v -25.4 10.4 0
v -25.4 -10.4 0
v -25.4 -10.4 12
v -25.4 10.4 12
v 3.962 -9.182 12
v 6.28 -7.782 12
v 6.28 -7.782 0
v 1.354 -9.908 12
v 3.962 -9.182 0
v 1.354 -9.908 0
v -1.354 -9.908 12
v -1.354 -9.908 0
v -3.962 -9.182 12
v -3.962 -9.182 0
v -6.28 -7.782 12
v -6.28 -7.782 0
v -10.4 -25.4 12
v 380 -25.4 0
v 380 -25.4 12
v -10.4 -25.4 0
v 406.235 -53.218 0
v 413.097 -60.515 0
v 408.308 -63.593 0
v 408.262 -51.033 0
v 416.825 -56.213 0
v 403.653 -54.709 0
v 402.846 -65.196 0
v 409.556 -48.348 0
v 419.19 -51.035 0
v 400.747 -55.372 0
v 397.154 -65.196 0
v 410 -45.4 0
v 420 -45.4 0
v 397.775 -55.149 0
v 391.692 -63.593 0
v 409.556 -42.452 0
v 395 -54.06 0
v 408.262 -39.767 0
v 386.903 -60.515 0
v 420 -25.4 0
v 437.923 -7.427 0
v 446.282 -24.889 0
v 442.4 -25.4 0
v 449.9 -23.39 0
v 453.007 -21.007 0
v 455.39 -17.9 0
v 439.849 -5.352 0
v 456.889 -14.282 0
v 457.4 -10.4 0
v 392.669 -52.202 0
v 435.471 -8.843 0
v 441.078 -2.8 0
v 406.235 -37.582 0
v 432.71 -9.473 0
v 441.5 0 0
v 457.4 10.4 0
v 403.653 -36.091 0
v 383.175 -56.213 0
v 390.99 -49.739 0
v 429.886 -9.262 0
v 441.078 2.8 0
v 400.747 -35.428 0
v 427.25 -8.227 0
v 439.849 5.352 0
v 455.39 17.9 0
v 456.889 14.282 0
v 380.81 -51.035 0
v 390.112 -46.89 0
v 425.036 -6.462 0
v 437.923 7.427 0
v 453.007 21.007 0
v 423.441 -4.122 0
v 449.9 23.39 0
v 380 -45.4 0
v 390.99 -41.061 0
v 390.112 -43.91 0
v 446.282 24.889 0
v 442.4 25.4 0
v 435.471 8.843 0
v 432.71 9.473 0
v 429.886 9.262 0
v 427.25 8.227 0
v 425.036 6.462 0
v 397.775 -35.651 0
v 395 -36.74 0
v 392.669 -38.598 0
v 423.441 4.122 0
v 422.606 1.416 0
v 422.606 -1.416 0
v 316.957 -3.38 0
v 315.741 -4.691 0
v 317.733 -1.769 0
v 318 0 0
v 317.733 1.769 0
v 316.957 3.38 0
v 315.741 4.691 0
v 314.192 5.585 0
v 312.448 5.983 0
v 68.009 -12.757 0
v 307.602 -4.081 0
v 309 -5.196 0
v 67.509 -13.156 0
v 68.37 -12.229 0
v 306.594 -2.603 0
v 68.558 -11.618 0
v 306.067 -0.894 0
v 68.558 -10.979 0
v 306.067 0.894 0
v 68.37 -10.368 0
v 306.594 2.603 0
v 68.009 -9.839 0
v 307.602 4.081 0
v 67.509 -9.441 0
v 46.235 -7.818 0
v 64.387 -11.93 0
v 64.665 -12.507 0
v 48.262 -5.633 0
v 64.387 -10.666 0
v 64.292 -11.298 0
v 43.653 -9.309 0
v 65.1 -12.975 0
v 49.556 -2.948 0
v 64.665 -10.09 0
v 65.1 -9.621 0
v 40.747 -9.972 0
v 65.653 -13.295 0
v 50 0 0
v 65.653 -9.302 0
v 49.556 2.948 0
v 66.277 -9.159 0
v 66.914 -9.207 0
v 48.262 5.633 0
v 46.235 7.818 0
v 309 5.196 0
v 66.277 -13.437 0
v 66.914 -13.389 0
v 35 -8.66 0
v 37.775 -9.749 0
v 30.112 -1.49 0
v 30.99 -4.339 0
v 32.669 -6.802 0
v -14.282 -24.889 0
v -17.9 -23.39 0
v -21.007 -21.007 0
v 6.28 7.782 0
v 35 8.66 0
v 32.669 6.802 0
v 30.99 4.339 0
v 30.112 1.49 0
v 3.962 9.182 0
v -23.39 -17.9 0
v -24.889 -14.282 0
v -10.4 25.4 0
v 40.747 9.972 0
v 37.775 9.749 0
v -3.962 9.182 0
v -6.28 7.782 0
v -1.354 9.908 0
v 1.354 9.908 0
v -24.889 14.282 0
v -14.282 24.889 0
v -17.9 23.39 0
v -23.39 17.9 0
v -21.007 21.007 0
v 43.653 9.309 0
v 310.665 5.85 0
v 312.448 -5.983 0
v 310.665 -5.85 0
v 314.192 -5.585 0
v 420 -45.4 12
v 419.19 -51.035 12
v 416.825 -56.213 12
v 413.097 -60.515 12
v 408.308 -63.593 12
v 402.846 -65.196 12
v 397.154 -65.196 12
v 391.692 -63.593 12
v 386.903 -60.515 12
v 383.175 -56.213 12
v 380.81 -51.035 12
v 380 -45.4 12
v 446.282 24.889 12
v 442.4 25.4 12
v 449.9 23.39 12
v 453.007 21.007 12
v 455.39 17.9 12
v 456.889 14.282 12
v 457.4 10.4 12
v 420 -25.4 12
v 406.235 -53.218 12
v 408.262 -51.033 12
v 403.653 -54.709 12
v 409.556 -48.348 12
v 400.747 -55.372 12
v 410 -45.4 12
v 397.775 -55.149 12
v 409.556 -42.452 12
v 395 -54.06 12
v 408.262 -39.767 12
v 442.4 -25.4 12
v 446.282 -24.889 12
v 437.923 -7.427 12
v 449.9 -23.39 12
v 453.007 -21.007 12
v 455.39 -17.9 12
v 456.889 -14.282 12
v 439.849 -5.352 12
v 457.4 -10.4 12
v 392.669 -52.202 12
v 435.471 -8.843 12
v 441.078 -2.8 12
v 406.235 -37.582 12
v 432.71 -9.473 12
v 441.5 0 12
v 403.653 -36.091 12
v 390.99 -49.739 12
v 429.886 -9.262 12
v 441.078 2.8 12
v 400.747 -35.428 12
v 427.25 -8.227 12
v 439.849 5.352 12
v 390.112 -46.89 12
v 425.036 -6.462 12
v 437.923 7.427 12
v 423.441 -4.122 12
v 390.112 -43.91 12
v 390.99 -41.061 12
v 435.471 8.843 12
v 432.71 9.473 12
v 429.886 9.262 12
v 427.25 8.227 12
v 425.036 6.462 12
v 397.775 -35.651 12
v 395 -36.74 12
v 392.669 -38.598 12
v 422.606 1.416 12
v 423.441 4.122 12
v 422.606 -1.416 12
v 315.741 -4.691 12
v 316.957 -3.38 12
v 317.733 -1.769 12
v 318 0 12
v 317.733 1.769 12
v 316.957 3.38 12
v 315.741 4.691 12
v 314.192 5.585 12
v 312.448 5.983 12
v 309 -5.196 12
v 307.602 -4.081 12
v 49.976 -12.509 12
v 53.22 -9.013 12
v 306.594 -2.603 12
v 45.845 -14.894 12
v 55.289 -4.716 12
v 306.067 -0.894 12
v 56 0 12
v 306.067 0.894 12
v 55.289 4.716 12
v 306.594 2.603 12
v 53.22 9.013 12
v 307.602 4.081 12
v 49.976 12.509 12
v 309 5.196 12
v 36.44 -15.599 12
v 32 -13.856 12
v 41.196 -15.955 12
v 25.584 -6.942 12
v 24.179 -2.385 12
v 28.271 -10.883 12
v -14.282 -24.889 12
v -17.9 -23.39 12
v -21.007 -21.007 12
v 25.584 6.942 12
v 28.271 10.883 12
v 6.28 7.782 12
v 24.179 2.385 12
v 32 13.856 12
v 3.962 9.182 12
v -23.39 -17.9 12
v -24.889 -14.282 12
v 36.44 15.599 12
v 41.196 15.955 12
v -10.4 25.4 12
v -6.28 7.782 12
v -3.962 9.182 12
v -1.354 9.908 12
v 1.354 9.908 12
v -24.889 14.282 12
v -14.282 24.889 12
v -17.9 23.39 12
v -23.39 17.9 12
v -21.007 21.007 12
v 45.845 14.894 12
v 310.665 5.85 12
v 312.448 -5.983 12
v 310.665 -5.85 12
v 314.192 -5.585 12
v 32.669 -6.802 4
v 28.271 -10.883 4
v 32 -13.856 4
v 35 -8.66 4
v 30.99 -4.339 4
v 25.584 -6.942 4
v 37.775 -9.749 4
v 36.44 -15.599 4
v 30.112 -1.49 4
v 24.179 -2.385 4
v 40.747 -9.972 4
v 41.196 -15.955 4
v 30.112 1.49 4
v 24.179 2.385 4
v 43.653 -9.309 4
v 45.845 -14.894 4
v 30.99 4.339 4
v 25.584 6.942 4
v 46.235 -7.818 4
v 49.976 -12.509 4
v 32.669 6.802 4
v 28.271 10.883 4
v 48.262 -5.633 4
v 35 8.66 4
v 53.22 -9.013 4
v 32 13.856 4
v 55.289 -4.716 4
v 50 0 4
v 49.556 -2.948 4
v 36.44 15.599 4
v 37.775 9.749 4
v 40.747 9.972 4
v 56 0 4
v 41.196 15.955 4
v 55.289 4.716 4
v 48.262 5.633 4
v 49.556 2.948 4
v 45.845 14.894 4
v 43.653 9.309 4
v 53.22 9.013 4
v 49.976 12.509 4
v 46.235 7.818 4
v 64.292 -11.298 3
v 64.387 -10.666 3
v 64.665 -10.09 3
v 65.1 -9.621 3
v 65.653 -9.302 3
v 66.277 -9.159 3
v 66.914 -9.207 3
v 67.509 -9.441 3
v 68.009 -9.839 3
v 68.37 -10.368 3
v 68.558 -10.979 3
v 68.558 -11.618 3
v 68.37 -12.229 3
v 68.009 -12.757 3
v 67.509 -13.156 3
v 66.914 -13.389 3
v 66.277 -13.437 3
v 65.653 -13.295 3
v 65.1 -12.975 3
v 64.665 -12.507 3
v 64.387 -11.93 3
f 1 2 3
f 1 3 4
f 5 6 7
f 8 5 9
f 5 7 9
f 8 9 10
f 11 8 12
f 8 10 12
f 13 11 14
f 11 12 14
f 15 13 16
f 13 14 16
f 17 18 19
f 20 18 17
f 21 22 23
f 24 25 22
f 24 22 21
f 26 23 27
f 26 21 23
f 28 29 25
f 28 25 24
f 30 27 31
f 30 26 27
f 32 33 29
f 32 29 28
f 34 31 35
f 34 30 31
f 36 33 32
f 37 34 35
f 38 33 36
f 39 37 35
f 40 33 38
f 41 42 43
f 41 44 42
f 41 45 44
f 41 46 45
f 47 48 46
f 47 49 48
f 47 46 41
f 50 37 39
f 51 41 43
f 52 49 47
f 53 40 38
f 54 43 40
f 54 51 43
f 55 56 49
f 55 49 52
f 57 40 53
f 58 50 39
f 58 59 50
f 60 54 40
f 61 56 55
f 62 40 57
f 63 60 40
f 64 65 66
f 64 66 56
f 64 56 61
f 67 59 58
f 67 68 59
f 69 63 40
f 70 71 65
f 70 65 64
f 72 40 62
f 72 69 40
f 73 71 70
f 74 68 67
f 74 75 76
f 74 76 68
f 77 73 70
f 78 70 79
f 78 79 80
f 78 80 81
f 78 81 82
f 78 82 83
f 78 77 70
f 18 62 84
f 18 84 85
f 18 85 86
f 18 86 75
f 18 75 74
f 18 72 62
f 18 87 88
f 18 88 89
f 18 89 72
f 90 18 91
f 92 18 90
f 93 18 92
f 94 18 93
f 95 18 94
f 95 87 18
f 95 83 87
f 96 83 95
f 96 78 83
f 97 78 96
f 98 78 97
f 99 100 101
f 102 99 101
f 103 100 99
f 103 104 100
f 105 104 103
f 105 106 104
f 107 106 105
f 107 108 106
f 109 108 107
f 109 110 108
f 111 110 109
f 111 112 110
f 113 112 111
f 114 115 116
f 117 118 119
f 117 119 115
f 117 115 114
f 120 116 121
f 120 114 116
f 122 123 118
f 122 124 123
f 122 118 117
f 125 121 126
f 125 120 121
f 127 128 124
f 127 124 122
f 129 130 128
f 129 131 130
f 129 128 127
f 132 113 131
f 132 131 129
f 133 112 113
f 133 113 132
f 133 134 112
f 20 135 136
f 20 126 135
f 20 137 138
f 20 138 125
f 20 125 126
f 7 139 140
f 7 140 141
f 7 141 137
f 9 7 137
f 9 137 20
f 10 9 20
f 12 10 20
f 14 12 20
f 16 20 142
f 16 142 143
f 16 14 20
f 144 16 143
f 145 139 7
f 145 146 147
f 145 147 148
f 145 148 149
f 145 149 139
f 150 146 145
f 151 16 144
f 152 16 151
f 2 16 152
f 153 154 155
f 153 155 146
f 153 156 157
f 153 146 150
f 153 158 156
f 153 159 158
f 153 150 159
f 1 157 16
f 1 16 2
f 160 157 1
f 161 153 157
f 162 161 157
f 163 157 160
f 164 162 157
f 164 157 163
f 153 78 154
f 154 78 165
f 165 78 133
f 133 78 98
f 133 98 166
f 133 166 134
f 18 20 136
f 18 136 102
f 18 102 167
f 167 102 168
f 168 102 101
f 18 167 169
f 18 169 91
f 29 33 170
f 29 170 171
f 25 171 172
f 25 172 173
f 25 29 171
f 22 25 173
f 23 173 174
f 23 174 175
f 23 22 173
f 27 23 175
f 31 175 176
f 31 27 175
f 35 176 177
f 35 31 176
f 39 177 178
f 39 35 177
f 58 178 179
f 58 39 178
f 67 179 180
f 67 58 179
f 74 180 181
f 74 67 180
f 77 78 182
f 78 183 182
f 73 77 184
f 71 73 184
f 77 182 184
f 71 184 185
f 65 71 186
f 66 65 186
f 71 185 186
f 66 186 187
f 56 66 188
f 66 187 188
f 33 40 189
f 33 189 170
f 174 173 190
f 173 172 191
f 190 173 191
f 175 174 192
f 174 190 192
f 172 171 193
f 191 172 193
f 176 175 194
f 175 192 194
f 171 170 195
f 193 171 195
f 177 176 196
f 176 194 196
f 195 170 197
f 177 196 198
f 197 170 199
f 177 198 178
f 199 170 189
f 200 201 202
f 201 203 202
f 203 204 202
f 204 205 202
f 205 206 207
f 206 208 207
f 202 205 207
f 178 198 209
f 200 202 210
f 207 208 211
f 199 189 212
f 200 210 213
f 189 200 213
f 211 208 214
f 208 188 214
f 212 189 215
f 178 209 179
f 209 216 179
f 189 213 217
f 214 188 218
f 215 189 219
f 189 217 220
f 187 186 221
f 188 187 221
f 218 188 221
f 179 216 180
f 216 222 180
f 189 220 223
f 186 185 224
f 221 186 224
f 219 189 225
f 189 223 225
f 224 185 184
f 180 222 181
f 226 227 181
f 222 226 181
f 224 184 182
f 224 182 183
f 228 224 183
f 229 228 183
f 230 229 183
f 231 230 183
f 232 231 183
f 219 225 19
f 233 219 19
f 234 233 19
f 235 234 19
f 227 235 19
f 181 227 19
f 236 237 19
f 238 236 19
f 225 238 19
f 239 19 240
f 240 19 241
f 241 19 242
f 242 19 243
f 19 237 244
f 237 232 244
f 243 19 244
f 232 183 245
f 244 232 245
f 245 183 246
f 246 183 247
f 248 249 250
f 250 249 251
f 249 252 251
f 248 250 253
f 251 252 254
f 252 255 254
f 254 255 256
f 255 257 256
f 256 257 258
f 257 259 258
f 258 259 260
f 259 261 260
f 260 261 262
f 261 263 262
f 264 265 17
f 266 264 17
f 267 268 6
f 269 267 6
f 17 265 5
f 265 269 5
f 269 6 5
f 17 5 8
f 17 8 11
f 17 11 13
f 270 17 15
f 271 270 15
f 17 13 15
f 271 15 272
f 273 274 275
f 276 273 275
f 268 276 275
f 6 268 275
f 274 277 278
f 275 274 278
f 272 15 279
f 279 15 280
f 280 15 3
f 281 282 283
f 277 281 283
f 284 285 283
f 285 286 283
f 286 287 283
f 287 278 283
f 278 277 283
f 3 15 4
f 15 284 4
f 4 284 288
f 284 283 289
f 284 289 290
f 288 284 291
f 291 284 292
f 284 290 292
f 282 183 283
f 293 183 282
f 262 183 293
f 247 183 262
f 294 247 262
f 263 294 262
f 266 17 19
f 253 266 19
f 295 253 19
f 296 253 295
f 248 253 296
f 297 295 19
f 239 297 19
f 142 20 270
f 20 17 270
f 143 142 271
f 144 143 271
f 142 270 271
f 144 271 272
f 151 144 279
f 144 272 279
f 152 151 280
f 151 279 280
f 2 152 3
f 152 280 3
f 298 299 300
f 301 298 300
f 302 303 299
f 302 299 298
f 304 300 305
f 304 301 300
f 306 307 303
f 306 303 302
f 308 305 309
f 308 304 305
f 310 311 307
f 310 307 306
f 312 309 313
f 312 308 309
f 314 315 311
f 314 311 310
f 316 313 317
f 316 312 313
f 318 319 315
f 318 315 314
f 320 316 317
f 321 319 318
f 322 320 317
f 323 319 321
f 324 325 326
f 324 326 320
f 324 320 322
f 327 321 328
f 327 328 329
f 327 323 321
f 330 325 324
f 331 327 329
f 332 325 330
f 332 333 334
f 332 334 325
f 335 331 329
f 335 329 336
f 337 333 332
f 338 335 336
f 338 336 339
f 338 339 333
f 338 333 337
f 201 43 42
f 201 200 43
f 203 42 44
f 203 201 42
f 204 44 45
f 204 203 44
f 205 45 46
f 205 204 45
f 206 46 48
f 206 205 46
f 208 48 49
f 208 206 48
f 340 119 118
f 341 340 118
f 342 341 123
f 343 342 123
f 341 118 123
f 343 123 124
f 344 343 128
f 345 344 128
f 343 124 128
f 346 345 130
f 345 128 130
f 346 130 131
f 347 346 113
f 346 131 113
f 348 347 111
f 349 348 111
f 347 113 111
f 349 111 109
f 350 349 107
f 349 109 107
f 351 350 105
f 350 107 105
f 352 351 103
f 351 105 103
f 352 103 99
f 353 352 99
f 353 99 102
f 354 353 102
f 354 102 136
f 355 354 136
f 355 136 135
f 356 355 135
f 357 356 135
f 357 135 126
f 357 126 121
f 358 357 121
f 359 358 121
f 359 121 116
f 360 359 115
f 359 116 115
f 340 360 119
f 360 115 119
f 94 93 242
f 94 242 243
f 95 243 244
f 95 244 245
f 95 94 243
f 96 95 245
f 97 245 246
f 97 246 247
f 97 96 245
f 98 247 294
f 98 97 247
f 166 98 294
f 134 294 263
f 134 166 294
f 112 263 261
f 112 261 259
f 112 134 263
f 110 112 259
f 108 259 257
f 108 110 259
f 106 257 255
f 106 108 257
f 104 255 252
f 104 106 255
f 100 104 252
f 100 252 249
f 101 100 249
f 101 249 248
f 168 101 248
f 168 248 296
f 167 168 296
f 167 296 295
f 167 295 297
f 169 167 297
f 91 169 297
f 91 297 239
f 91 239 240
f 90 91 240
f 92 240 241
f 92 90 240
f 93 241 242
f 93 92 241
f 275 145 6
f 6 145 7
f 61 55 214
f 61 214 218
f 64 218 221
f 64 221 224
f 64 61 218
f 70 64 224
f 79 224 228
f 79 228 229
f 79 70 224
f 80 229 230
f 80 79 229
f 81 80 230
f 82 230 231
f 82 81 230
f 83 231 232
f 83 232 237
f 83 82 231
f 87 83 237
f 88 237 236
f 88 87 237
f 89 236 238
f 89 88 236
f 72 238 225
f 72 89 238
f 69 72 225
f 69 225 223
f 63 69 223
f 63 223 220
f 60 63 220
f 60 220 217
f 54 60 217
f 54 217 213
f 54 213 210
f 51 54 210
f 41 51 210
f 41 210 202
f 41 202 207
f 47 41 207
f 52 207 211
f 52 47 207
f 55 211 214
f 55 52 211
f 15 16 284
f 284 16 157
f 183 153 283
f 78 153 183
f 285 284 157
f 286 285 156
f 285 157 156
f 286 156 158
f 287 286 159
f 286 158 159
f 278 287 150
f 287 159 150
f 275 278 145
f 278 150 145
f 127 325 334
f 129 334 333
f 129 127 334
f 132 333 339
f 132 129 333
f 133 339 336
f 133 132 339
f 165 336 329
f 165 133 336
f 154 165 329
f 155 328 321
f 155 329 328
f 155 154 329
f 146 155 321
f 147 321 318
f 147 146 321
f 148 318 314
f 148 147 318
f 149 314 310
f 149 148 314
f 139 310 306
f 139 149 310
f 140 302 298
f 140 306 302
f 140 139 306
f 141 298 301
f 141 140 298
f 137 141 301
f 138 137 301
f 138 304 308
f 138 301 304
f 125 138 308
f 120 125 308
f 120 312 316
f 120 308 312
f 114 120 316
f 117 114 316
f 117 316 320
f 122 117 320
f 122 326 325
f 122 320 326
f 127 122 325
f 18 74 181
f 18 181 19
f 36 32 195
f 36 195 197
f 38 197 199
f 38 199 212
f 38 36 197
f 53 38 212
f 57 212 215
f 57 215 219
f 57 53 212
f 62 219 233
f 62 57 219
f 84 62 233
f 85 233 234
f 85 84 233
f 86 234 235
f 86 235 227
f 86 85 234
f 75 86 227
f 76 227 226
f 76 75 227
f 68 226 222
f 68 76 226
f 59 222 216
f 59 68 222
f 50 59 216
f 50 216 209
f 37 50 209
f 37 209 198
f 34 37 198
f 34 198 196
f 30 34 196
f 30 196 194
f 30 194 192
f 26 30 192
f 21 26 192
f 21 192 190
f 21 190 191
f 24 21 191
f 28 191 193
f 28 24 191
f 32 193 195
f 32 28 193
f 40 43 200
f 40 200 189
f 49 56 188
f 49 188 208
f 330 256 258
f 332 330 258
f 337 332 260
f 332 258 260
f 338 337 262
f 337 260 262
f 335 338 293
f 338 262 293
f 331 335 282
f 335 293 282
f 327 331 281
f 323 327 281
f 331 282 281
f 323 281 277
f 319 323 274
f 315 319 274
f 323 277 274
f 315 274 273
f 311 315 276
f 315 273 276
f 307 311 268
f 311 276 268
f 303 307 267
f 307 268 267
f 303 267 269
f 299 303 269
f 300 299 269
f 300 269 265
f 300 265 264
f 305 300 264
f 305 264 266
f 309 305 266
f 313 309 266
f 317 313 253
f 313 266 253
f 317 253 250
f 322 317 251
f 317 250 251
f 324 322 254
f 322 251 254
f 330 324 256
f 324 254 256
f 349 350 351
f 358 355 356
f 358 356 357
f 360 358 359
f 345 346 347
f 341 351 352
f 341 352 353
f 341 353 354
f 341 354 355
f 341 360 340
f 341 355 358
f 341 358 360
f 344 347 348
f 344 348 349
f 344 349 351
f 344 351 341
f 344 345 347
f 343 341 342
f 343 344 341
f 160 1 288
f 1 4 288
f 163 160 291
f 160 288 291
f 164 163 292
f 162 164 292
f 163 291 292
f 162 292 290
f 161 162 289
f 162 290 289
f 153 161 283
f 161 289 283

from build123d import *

# Parameters (mm, degrees)
CROQUIS1_R              = 9.5
CROQUIS1_R_2            = 10
CROQUIS1_R_3            = 6
SALIENTE_EXTRUIR1_DEPTH = 12
CROQUIS2_R              = 2.144956207
CORTAR_EXTRUIR1_DEPTH   = 3
REDONDEO1_R             = 15
REDONDEO2_R             = 15
CROQUIS4_R              = 16
CORTAR_EXTRUIR2_DEPTH   = 8


with BuildPart() as part:
    # Croquis1 → Saliente-Extruir1 (new body)
    with BuildSketch(Plane.XY):
        with BuildLine():
            Line((380, -45.4), (380, -25.4))
            Line((380, -25.4), (-25.4, -25.4))
            Line((-25.4, -25.4), (-25.4, 25.4))
            Line((-25.4, 25.4), (457.4, 25.4))
            Line((457.4, 25.4), (457.4, -25.4))
            Line((457.4, -25.4), (420, -25.4))
            Line((420, -25.4), (420, -45.4))
            ThreePointArc((420, -45.4), (400, -65.4), (380, -45.4))
        make_face()
        with Locations((432, 0)):
            Circle(CROQUIS1_R, mode=Mode.SUBTRACT)
        with Locations((40, 0)):
            Circle(CROQUIS1_R_2, mode=Mode.SUBTRACT)
        with Locations((312, 0)):
            Circle(CROQUIS1_R_3, mode=Mode.SUBTRACT)
        with Locations((400, -45.4)):
            Circle(CROQUIS1_R_2, mode=Mode.SUBTRACT)
        with BuildLine():
            Line((-6.28, -7.782133384), (-6.28, 7.782133384))
            ThreePointArc((-6.28, 7.782133384), (0, 10), (6.28, 7.782133384))
            Line((6.28, 7.782133384), (6.28, -7.782133384))
            ThreePointArc((6.28, -7.782133384), (0, -10), (-6.28, -7.782133384))
        make_face(mode=Mode.SUBTRACT)
    extrude(amount=SALIENTE_EXTRUIR1_DEPTH)

    # Croquis2 → Cortar-Extruir1 (cut)
    with BuildSketch(Plane(origin=(0, 0, 0), x_dir=(-1, 0, 0), z_dir=(0, 0, -1))):
        with Locations((-66.437001332, -11.298220954)):
            Circle(CROQUIS2_R)
    extrude(amount=-CORTAR_EXTRUIR1_DEPTH, mode=Mode.SUBTRACT)

    # Redondeo1
    redondeo1_edges = [part.edges().sort_by_distance(p)[0] for p in [
        (-25.4, 25.4, 6),
        (-25.4, -25.4, 6),
    ]]
    fillet(redondeo1_edges, radius=REDONDEO1_R)

    # Redondeo2
    redondeo2_edges = [part.edges().sort_by_distance(p)[0] for p in [
        (457.4, 25.4, 6),
        (457.4, -25.4, 6),
    ]]
    fillet(redondeo2_edges, radius=REDONDEO2_R)

    # Croquis4 → Cortar-Extruir2 (cut)
    with BuildSketch(Plane.XY.offset(12)):
        with Locations((40, 0)):
            Circle(CROQUIS4_R)
    extrude(amount=-CORTAR_EXTRUIR2_DEPTH, mode=Mode.SUBTRACT)


solid = part.part
